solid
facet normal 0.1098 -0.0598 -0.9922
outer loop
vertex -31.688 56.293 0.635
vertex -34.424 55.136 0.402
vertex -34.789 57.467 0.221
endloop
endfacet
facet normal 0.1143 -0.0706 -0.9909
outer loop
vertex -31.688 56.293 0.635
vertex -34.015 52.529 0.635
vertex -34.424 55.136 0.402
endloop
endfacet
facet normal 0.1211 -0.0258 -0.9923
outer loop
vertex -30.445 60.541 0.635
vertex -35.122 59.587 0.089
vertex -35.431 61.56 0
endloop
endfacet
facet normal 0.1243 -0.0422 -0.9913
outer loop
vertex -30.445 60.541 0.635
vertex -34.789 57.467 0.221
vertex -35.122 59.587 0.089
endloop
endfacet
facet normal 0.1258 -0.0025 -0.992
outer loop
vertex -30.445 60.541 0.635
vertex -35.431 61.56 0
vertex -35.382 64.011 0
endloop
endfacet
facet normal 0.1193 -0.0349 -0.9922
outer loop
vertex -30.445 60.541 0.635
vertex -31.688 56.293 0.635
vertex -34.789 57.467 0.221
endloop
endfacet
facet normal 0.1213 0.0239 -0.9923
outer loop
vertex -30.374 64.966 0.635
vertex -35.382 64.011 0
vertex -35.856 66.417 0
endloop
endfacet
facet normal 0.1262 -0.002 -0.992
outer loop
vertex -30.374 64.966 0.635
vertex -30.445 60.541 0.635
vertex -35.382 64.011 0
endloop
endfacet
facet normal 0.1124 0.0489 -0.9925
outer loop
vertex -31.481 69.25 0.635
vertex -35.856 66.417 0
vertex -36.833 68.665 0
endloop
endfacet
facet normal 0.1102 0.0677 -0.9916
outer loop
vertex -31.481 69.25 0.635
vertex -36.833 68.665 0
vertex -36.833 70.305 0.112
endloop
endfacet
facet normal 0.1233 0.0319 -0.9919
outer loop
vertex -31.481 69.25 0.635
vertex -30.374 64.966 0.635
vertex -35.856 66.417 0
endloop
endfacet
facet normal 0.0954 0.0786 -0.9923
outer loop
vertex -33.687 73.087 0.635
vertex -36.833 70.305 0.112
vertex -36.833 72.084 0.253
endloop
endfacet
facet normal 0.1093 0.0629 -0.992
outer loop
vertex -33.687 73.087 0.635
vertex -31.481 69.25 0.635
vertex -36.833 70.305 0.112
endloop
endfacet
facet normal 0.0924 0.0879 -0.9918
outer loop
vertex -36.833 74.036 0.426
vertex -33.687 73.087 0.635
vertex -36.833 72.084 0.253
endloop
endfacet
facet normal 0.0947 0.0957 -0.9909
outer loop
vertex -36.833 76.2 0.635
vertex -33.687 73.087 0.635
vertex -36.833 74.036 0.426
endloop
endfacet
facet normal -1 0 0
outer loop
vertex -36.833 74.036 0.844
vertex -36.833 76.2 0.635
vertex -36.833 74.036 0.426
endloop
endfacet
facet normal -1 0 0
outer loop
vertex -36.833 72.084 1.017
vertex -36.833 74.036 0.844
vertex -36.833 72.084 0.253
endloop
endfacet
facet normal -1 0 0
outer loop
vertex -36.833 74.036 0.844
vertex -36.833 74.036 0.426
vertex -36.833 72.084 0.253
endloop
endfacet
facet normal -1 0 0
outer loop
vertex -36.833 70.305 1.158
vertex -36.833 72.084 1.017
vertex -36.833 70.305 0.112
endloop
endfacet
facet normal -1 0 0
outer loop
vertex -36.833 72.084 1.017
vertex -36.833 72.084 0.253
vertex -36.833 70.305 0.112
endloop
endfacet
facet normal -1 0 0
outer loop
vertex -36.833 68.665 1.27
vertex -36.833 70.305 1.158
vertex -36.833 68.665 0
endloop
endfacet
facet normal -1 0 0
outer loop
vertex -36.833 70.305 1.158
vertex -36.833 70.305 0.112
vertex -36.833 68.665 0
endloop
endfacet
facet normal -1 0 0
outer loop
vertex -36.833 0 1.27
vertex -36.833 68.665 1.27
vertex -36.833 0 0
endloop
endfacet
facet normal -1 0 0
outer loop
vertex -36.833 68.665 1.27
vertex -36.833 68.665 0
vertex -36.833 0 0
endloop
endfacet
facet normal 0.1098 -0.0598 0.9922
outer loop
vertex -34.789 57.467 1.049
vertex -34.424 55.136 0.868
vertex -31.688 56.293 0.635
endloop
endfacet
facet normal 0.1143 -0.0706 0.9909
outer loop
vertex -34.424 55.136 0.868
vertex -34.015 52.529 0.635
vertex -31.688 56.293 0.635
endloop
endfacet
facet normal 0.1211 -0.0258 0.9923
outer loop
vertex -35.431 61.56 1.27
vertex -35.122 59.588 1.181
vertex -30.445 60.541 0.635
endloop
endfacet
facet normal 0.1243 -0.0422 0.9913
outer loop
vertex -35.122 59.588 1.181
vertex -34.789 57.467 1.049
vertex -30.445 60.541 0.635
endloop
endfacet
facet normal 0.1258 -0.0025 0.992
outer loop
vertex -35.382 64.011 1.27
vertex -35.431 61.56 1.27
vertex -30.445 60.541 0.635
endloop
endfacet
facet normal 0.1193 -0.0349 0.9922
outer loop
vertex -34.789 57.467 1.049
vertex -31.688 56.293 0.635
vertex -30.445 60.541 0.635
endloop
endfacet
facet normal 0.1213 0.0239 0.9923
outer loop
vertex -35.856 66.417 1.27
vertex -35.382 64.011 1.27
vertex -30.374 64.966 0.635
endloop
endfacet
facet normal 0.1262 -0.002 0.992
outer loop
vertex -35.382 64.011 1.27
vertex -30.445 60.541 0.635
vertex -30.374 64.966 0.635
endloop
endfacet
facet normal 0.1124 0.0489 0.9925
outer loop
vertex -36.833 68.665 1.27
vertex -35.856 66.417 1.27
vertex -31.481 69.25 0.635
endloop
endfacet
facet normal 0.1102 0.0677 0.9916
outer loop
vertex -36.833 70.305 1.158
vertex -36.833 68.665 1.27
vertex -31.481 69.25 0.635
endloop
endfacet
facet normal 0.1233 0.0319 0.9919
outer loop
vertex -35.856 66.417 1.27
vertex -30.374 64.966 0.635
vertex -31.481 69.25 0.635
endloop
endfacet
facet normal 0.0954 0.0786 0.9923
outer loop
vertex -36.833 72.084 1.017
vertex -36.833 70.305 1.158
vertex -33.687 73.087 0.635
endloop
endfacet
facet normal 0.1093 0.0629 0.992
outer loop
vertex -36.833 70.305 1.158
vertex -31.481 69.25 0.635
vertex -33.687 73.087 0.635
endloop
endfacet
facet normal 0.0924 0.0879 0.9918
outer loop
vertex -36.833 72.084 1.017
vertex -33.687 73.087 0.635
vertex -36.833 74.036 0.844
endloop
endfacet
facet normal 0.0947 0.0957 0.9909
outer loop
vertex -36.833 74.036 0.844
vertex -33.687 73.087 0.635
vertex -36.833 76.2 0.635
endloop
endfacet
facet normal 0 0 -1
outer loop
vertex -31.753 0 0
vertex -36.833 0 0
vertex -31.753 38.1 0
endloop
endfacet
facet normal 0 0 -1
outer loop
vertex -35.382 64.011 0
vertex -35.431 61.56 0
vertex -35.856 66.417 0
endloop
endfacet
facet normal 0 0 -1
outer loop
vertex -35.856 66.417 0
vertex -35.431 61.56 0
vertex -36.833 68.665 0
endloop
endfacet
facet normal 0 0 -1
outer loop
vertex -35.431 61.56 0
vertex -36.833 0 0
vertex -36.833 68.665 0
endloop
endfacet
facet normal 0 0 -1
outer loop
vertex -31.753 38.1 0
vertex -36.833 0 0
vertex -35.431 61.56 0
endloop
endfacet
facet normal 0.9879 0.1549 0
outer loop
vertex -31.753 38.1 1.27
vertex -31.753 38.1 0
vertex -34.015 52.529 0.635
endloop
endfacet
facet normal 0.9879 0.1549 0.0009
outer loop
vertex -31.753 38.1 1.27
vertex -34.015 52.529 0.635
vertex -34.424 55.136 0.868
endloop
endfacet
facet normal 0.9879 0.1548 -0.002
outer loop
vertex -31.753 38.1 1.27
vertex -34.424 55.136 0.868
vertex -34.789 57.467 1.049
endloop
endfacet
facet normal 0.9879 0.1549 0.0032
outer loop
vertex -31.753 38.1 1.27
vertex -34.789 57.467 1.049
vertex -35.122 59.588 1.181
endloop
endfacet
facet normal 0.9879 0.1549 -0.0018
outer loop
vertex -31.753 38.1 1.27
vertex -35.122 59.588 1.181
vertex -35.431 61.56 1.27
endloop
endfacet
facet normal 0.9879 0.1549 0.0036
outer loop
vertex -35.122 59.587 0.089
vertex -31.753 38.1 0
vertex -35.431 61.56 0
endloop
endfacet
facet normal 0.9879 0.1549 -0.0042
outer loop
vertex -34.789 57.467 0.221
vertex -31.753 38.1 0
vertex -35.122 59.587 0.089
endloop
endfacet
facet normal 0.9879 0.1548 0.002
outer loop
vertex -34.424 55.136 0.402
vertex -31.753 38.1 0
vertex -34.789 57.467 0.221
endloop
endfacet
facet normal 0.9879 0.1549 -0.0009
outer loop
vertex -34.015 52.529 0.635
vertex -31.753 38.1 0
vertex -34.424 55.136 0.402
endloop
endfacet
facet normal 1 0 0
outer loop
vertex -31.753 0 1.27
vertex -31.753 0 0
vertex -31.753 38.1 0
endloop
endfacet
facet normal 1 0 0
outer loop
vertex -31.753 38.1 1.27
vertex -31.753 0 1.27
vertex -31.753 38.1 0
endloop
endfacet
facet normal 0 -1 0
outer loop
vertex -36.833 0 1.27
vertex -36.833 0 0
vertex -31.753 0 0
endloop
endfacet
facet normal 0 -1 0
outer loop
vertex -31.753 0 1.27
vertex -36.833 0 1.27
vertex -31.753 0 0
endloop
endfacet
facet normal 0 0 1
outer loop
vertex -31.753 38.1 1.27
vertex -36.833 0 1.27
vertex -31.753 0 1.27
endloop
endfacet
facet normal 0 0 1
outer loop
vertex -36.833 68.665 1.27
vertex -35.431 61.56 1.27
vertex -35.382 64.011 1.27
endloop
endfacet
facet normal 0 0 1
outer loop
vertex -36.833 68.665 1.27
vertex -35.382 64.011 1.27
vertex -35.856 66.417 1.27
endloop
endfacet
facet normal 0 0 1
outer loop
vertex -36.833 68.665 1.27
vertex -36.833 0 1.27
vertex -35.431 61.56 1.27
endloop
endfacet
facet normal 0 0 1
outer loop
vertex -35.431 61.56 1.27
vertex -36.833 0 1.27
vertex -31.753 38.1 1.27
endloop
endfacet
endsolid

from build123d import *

# Parameters (mm, degrees)
F1_DEPTH   = 1.27
F2_SIZE2   = 0.635
F2_SIZE    = 5.08
F2_2_SIZE2 = 0.63499
F2_2_SIZE  = 5.07999


# Not quite as in the source:
# - a fillet or chamfer is up to 0.001 mm smaller than in the source, because OpenCascade refuses the exact size


with BuildPart() as f1:
    # F0 (on Top) → F1 (new body)
    with BuildSketch(Plane.XY):
        with BuildLine():
            Line((-36.8330654015, 25.4), (-36.8330654015, 0))
            Line((-36.8330654015, 0), (-31.7530654015, 0))
            Line((-31.7530654015, 0), (-31.7530654015, 25.4))
            Line((-31.7530654015, 25.4), (-31.7530654015, 38.1))
            Line((-31.7530654015, 38.1), (-34.0151443949, 52.5287568289))
            ThreePointArc((-34.0151443949, 52.5287568289), (-30.3739911163, 64.9655644869), (-36.8330654015, 76.2))
            Line((-36.8330654015, 76.2), (-36.8330654015, 25.4))
        make_face()
    extrude(amount=F1_DEPTH)

    # F2
    f2_edges = [f1.edges().sort_by_distance(p)[0] for p in [
        (-30.373991, 64.965564, 1.27),
    ]]
    f2_side = f1.faces().sort_by_distance((-34.308504, 37.141649, 1.27))[0]
    chamfer(f2_edges, length=F2_SIZE, length2=F2_SIZE2, reference=f2_side)

    # F2#2 (size 5.08 and 0.635 in the source; OpenCascade refuses exactly that, so slightly less here)
    f2_2_edges = [f1.edges().sort_by_distance(p)[0] for p in [
        (-30.373991, 64.965564, 0),
    ]]
    f2_2_side = f1.faces().sort_by_distance((-34.308504, 37.141649, 0))[0]
    chamfer(f2_2_edges, length=F2_2_SIZE, length2=F2_2_SIZE2, reference=f2_2_side)


solid = f1.part
